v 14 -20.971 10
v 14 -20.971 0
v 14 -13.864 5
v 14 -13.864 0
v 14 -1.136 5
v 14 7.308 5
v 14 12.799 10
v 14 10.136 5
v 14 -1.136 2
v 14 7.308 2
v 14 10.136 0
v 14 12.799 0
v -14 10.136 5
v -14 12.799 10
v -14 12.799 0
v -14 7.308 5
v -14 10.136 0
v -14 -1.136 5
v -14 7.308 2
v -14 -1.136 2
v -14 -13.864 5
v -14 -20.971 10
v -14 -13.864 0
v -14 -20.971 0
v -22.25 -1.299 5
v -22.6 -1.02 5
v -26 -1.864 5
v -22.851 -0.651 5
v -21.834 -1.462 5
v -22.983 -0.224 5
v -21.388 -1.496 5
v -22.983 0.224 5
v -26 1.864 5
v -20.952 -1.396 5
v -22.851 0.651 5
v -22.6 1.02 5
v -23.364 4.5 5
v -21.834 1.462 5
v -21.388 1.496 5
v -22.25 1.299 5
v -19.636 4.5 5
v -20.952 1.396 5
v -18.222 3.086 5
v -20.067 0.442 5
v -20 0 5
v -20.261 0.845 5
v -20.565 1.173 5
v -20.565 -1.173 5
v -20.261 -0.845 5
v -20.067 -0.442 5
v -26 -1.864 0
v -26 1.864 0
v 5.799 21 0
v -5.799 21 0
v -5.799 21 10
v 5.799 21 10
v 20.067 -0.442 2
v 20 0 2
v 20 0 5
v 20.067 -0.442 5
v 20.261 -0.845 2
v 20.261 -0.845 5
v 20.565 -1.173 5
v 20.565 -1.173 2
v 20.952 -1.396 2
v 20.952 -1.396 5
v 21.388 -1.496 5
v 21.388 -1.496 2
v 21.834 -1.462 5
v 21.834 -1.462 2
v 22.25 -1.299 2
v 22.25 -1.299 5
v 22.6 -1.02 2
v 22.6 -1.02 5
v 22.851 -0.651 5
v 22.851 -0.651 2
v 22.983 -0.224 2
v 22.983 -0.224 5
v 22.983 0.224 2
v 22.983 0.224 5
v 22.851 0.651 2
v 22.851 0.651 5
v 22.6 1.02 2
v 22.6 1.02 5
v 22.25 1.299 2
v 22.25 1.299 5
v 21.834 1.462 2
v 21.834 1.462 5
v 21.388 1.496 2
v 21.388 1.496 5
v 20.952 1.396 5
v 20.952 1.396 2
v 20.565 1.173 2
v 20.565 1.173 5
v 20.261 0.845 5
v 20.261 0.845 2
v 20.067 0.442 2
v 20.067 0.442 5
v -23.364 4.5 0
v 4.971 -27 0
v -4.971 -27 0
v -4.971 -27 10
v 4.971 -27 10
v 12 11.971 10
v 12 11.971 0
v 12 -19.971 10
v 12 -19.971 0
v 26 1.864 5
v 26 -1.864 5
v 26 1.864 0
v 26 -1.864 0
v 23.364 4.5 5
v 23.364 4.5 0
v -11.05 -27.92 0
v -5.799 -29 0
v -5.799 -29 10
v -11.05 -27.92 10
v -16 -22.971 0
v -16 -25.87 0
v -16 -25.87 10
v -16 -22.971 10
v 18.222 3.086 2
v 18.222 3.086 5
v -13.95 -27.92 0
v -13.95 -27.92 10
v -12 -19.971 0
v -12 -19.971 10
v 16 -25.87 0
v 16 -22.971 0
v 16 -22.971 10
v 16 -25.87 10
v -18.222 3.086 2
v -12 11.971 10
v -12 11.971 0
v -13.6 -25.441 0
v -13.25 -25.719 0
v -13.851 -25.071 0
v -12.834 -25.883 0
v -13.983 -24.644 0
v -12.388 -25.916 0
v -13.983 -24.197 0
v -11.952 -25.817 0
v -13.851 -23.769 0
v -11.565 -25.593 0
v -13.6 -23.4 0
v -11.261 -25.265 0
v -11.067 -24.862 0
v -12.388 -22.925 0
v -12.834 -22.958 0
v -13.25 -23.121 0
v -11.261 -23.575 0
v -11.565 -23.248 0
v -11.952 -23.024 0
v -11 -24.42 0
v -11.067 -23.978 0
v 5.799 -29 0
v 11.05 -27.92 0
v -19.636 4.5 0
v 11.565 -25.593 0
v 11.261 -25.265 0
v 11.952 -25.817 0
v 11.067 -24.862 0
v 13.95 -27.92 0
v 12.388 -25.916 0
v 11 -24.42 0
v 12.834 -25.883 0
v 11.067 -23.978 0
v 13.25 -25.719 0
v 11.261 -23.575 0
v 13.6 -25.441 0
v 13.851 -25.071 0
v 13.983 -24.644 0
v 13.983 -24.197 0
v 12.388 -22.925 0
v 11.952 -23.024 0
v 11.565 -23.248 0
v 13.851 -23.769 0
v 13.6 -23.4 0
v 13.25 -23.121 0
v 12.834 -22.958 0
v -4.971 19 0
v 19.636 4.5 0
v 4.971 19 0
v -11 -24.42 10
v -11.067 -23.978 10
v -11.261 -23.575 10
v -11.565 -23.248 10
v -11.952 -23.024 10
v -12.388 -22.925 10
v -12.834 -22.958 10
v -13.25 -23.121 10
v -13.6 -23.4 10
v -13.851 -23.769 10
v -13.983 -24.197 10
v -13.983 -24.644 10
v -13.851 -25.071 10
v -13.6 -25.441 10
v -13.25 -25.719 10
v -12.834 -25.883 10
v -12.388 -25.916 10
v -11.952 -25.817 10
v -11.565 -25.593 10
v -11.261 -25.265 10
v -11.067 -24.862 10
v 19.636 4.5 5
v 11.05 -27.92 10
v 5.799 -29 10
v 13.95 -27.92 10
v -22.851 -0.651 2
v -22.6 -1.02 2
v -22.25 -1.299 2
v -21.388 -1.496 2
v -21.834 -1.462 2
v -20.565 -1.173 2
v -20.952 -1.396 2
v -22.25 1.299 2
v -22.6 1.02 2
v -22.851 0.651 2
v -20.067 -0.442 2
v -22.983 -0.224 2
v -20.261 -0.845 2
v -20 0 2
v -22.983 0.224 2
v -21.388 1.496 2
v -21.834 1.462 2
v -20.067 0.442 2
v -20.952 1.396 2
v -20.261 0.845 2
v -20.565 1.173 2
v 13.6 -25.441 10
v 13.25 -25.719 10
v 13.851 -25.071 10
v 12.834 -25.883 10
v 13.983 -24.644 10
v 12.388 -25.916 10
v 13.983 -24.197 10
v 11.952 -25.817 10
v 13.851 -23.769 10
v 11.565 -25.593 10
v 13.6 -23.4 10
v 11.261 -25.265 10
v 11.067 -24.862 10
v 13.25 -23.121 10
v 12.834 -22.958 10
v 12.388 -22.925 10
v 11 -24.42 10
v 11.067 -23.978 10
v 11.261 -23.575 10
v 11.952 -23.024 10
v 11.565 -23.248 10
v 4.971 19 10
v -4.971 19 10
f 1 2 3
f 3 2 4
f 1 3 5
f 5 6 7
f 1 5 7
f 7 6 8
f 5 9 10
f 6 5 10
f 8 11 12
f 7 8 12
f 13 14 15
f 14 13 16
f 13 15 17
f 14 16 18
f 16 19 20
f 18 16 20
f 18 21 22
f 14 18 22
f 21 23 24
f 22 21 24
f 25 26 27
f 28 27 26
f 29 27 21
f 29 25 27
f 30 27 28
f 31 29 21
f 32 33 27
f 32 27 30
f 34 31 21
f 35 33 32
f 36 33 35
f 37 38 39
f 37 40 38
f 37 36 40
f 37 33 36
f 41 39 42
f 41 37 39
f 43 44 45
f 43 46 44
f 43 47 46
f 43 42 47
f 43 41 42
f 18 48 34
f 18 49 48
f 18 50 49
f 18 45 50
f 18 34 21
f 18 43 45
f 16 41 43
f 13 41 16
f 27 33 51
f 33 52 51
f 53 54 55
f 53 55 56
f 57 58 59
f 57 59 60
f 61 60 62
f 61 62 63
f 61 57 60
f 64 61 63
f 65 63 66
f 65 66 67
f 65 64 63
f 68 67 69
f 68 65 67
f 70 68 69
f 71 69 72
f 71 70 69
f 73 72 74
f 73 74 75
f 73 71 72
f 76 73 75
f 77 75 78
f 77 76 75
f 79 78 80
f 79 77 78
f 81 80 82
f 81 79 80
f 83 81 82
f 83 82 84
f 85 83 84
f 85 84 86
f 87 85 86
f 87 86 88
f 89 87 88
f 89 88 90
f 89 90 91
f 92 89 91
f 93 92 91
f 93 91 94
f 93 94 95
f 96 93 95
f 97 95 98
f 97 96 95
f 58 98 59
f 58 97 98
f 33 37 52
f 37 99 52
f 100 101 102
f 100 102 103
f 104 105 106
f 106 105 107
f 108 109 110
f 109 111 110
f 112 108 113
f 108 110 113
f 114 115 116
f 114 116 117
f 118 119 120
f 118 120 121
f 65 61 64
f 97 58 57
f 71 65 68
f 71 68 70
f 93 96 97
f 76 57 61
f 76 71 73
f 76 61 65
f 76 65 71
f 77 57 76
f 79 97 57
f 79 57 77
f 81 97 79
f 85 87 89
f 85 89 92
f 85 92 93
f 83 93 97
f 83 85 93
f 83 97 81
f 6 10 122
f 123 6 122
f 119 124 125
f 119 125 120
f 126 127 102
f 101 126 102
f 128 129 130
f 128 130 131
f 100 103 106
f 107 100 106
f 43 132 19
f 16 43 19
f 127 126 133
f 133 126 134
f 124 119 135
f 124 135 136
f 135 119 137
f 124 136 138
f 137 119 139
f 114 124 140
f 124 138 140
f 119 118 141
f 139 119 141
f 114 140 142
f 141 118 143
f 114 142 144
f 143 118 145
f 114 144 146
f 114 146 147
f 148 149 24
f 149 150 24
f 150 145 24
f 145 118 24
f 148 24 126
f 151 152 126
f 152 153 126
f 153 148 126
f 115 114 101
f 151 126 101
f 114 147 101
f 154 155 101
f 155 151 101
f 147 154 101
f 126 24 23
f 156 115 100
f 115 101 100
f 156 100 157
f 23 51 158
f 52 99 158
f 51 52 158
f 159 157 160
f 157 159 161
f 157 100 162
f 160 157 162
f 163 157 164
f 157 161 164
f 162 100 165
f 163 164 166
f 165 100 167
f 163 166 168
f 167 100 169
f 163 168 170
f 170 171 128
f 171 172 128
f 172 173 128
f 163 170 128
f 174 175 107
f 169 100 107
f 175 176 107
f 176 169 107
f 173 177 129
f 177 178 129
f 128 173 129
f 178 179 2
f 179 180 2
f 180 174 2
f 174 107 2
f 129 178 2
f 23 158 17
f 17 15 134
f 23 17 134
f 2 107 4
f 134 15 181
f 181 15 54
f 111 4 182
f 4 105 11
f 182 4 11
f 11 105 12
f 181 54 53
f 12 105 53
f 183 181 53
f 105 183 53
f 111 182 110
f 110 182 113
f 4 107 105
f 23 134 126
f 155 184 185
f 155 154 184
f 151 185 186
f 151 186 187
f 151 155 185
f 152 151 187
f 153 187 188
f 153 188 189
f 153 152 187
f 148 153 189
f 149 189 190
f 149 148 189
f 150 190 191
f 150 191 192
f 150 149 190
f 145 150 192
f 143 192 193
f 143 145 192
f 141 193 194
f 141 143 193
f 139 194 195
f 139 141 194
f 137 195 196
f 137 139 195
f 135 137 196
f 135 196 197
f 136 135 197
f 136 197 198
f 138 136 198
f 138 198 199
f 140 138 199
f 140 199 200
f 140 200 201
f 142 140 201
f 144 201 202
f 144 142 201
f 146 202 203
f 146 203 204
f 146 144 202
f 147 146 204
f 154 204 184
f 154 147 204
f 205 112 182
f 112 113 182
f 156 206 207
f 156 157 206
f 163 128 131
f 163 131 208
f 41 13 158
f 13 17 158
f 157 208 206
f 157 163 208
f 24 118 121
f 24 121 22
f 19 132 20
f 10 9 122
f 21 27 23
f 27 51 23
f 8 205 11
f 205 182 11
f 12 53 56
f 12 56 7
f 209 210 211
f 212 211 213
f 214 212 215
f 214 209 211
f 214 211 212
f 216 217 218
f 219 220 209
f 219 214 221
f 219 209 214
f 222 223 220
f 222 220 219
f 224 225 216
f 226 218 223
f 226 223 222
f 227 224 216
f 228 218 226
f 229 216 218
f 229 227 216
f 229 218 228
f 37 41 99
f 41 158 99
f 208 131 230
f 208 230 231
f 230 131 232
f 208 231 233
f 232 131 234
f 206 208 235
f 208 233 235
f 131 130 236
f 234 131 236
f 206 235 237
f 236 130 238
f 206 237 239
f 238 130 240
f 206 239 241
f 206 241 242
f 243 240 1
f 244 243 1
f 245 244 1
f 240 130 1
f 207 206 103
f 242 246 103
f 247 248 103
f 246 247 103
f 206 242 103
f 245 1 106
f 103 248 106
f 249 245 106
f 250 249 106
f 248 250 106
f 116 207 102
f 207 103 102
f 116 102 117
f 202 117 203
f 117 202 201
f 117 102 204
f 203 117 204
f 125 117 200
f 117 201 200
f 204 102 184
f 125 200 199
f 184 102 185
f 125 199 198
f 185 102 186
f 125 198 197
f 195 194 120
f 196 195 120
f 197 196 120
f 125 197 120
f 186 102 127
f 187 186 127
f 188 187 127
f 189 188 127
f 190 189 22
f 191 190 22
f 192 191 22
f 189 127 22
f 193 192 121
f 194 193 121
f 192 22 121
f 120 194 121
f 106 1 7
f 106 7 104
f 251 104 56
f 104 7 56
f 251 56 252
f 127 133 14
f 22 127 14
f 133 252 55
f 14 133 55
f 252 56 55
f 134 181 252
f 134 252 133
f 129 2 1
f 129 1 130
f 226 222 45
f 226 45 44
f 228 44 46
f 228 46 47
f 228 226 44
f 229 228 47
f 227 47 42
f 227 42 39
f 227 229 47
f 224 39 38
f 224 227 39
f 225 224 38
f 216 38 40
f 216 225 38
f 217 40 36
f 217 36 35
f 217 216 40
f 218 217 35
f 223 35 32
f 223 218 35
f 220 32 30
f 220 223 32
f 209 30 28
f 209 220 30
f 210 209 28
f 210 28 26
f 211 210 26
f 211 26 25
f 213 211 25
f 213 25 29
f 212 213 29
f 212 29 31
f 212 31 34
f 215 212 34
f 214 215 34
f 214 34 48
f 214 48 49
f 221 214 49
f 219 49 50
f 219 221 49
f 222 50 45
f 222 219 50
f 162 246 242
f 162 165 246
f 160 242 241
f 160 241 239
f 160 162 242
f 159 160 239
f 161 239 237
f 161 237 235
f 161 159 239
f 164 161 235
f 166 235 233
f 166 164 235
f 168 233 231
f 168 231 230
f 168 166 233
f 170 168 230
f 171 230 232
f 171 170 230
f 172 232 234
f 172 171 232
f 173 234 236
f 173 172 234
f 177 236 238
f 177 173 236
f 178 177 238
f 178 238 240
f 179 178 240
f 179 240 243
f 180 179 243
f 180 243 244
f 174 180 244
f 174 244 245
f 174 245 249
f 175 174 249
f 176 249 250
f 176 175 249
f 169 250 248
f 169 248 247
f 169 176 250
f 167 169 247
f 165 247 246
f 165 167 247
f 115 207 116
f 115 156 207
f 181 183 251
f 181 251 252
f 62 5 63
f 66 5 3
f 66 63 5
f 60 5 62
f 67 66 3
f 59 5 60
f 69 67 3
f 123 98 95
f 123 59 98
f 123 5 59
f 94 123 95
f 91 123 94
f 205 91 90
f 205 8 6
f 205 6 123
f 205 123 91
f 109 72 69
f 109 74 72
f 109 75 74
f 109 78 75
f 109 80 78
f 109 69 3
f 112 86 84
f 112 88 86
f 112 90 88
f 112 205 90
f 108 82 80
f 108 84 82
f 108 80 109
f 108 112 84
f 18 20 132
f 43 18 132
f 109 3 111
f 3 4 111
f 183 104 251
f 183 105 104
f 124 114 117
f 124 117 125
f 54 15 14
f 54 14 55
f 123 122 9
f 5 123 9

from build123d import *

# Parameters (mm, degrees)
SKETCH2_R           = 1.5
BOSS_EXTRUDE1_DEPTH = 2
SKETCH5_R           = 1.5
BOSS_EXTRUDE4_DEPTH = 3
SKETCH6_R           = 1.5
BOSS_EXTRUDE5_DEPTH = 5


with BuildPart() as part:
    # Sketch2 → Boss-Extrude1 (new body)
    with BuildSketch(Plane.XY):
        Polygon((-26, -1.863961031), (-23.363961031, -4.5), (-14, -13.863961031), (-14, -20.798989873), (-14, -20.970562748), (-16, -22.970562748), (-16, -25.870057685), (-13.949747468, -27.920310217), (-11.050252532, -27.920310217), (-5.798989873, -29), (5.798989873, -29), (11.050252532, -27.920310217), (13.949747468, -27.920310217), (16, -25.870057685), (16, -22.970562748), (14, -20.970562748), (14, -20.798989873), (14, -13.863961031), (23.363961031, -4.5), (26, -1.863961031), (26, 1.863961031), (23.363961031, 4.5), (19.636038969, 4.5), (14, 10.136038969), (14, 12.798989873), (5.798989873, 21), (-5.798989873, 21), (-14, 12.798989873), (-14, 10.136038969), (-19.636038969, 4.5), (-23.363961031, 4.5), (-26, 1.863961031), align=None)
        with Locations((-12.5, -24.420310217)):
            Circle(SKETCH2_R, mode=Mode.SUBTRACT)
        with Locations((12.5, -24.420310217)):
            Circle(SKETCH2_R, mode=Mode.SUBTRACT)
        Polygon((4.970562748, 19), (-4.970562748, 19), (-12, 11.970562748), (-12, 0), (-12, -19.970562748), (-4.970562748, -27), (4.970562748, -27), (12, -19.970562748), (12, 0), (12, 11.970562748), align=None, mode=Mode.SUBTRACT)
    extrude(amount=BOSS_EXTRUDE1_DEPTH)

    # Sketch5 → Boss-Extrude4 (add)
    with BuildSketch(Plane.XY.offset(2)):
        Polygon((-5.798989873, 21), (-14, 12.798989873), (-14, 10.136038969), (-19.636038969, 4.5), (-23.363961031, 4.5), (-26, 1.863961031), (-26, -1.863961031), (-23.363961031, -4.5), (-14, -13.863961031), (-14, -20.798989873), (-14, -20.970562748), (-16, -22.970562748), (-16, -25.870057685), (-13.949747468, -27.920310217), (-11.050252532, -27.920310217), (-5.798989873, -29), (5.798989873, -29), (11.050252532, -27.920310217), (13.949747468, -27.920310217), (16, -25.870057685), (16, -22.970562748), (14, -20.970562748), (14, -20.798989873), (14, -13.863961031), (23.363961031, -4.5), (26, -1.863961031), (26, 1.863961031), (23.363961031, 4.5), (19.636038969, 4.5), (14, 10.136038969), (14, 12.798989873), (5.798989873, 21), align=None)
        with Locations((-21.5, 0)):
            Circle(SKETCH5_R, mode=Mode.SUBTRACT)
        with Locations((21.5, 0)):
            Circle(SKETCH5_R, mode=Mode.SUBTRACT)
        with Locations((-12.5, -24.420310217)):
            Circle(SKETCH5_R, mode=Mode.SUBTRACT)
        with Locations((12.5, -24.420310217)):
            Circle(SKETCH5_R, mode=Mode.SUBTRACT)
        Polygon((-18.221825407, 3.085786438), (-14, 7.307611845), (-14, 0), (-14, -1.136038969), (-17, 1.863961031), align=None, mode=Mode.SUBTRACT)
        Polygon((4.970562748, -27), (-4.970562748, -27), (-12, -19.970562748), (-12, 0), (-12, 11.970562748), (-4.970562748, 19), (4.970562748, 19), (12, 11.970562748), (12, 0), (12, -19.970562748), align=None, mode=Mode.SUBTRACT)
        Polygon((14, -1.136038969), (14, 0), (14, 7.307611845), (18.221825407, 3.085786438), (17, 1.863961031), align=None, mode=Mode.SUBTRACT)
    extrude(amount=BOSS_EXTRUDE4_DEPTH)

    # Sketch6 → Boss-Extrude5 (add)
    with BuildSketch(Plane.XY.offset(5)):
        Polygon((5.798989873, -29), (-5.798989873, -29), (-11.050252532, -27.920310217), (-13.949747468, -27.920310217), (-16, -25.870057685), (-16, -22.970562748), (-14, -20.970562748), (-14, -20.798989873), (-14, 0), (-14, 12.798989873), (-5.798989873, 21), (5.798989873, 21), (14, 12.798989873), (14, 0), (14, -20.798989873), (14, -20.970562748), (16, -22.970562748), (16, -25.870057685), (13.949747468, -27.920310217), (11.050252532, -27.920310217), align=None)
        with Locations((-12.5, -24.420310217)):
            Circle(SKETCH6_R, mode=Mode.SUBTRACT)
        with Locations((12.5, -24.420310217)):
            Circle(SKETCH6_R, mode=Mode.SUBTRACT)
        Polygon((4.970562748, 19), (-4.970562748, 19), (-12, 11.970562748), (-12, 0), (-12, -19.970562748), (-4.970562748, -27), (4.970562748, -27), (12, -19.970562748), (12, 0), (12, 11.970562748), align=None, mode=Mode.SUBTRACT)
    extrude(amount=BOSS_EXTRUDE5_DEPTH)


solid = part.part
